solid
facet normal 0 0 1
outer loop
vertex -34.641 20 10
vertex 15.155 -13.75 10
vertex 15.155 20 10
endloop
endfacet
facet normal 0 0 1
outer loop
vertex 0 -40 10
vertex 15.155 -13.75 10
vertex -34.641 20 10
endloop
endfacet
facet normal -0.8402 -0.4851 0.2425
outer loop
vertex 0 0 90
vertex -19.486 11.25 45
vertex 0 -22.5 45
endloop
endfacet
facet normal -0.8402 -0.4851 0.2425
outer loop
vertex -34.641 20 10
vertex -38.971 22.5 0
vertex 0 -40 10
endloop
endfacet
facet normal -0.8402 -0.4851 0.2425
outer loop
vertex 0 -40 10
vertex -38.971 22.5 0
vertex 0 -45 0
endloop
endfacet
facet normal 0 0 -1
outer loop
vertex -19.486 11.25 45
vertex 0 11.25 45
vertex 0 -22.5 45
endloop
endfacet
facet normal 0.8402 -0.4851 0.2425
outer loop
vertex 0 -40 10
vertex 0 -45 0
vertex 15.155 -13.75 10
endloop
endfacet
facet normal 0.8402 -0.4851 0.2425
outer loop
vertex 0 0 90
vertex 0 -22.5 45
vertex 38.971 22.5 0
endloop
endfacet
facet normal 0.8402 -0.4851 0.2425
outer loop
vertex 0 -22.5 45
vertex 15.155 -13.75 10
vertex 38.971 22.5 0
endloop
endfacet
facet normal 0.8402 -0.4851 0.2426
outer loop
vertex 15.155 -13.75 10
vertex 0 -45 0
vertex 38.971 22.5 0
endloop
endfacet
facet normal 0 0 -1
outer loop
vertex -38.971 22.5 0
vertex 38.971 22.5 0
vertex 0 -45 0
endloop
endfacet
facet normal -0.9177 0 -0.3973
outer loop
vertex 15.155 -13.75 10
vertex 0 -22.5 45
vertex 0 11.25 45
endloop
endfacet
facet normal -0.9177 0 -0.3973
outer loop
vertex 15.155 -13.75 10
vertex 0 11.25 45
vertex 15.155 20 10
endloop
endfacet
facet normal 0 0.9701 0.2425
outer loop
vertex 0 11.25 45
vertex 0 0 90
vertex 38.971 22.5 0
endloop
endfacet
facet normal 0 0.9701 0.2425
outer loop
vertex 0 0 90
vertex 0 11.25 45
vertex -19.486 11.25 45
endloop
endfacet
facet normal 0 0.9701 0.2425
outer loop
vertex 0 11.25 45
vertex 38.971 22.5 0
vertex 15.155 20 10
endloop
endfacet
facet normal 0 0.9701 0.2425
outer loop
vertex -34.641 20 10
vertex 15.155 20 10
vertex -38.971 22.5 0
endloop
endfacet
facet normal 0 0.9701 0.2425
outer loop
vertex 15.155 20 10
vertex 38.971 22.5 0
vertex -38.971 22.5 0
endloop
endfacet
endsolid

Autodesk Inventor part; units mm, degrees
ref_plane "YZ Plane" through (0, 0, 0) normal (1, 0, 0) x (0, 1, 0)
ref_plane "XZ Plane" through (0, 0, 0) normal (0, 1, 0) x (-1, 0, 0)
sketch "Эскиз1" plane through (0, 0, 0) normal (0, 0, 1) x (1, 0, 0)
  circle A0 centre (0, 0) radius 45
  line L0 (0, -45) -> (-38.9711, 22.5)
  line L1 (-38.9711, 22.5) -> (38.9711, 22.5)
  line L2 (38.9711, 22.5) -> (0, -45)
  dimension "d0" = 90
ref_plane "РабПлоскость1" through (0, 0, 90) normal (0, 0, 1) x (1, 0, 0)
sketch "Эскиз5" plane through (0, 0, 0) normal (0, 1, 0) x (-1, 0, 0)
  point P0 (0, 0)
sketch "Эскиз6" plane through (0, 0, 0) normal (1, 0, 0) x (0, 1, 0)
  point P0 (0, 0)
sketch "Эскиз7" plane through (0, 0, 0) normal (0, 1, 0) x (-1, 0, 0)
  point P0 (0, 0)
sketch "Эскиз8" plane through (0, 0, 90) normal (0, 0, 1) x (1, 0, 0)
  point P0 (0, 0)
loft "Лофт2" add profiles "Эскиз1" section 1 point at (0, 0, 90) contours L2 L0 L1
sketch "Эскиз9" plane through (0, 0, 0) normal (0, 1, 0) x (-1, 0, 0)
  point P0 (0, 0)
sketch "Эскиз10" plane through (0, 0, 0) normal (0, 1, 0) x (-1, 0, 0)
  line L0 (0, 10) -> (34.641, 10)
  line L1 (0, 90) -> (38.9711, 0) projected
  line L2 (0, 45) -> (19.4856, 45)
  line L3 (0, 45) -> (-15.1554, 10)
  line L4 (0, 90) -> (-38.9711, 0) projected
  line L5 (-15.1554, 10) -> (0, 10)
  line L6 (19.4856, 45) -> (34.641, 10)
  point P0 (0, 0)
extrude "Выдавливание1" cut sketch "Эскиз10" along normal mid plane 10000
properties part number "Деталь2Инди1"
